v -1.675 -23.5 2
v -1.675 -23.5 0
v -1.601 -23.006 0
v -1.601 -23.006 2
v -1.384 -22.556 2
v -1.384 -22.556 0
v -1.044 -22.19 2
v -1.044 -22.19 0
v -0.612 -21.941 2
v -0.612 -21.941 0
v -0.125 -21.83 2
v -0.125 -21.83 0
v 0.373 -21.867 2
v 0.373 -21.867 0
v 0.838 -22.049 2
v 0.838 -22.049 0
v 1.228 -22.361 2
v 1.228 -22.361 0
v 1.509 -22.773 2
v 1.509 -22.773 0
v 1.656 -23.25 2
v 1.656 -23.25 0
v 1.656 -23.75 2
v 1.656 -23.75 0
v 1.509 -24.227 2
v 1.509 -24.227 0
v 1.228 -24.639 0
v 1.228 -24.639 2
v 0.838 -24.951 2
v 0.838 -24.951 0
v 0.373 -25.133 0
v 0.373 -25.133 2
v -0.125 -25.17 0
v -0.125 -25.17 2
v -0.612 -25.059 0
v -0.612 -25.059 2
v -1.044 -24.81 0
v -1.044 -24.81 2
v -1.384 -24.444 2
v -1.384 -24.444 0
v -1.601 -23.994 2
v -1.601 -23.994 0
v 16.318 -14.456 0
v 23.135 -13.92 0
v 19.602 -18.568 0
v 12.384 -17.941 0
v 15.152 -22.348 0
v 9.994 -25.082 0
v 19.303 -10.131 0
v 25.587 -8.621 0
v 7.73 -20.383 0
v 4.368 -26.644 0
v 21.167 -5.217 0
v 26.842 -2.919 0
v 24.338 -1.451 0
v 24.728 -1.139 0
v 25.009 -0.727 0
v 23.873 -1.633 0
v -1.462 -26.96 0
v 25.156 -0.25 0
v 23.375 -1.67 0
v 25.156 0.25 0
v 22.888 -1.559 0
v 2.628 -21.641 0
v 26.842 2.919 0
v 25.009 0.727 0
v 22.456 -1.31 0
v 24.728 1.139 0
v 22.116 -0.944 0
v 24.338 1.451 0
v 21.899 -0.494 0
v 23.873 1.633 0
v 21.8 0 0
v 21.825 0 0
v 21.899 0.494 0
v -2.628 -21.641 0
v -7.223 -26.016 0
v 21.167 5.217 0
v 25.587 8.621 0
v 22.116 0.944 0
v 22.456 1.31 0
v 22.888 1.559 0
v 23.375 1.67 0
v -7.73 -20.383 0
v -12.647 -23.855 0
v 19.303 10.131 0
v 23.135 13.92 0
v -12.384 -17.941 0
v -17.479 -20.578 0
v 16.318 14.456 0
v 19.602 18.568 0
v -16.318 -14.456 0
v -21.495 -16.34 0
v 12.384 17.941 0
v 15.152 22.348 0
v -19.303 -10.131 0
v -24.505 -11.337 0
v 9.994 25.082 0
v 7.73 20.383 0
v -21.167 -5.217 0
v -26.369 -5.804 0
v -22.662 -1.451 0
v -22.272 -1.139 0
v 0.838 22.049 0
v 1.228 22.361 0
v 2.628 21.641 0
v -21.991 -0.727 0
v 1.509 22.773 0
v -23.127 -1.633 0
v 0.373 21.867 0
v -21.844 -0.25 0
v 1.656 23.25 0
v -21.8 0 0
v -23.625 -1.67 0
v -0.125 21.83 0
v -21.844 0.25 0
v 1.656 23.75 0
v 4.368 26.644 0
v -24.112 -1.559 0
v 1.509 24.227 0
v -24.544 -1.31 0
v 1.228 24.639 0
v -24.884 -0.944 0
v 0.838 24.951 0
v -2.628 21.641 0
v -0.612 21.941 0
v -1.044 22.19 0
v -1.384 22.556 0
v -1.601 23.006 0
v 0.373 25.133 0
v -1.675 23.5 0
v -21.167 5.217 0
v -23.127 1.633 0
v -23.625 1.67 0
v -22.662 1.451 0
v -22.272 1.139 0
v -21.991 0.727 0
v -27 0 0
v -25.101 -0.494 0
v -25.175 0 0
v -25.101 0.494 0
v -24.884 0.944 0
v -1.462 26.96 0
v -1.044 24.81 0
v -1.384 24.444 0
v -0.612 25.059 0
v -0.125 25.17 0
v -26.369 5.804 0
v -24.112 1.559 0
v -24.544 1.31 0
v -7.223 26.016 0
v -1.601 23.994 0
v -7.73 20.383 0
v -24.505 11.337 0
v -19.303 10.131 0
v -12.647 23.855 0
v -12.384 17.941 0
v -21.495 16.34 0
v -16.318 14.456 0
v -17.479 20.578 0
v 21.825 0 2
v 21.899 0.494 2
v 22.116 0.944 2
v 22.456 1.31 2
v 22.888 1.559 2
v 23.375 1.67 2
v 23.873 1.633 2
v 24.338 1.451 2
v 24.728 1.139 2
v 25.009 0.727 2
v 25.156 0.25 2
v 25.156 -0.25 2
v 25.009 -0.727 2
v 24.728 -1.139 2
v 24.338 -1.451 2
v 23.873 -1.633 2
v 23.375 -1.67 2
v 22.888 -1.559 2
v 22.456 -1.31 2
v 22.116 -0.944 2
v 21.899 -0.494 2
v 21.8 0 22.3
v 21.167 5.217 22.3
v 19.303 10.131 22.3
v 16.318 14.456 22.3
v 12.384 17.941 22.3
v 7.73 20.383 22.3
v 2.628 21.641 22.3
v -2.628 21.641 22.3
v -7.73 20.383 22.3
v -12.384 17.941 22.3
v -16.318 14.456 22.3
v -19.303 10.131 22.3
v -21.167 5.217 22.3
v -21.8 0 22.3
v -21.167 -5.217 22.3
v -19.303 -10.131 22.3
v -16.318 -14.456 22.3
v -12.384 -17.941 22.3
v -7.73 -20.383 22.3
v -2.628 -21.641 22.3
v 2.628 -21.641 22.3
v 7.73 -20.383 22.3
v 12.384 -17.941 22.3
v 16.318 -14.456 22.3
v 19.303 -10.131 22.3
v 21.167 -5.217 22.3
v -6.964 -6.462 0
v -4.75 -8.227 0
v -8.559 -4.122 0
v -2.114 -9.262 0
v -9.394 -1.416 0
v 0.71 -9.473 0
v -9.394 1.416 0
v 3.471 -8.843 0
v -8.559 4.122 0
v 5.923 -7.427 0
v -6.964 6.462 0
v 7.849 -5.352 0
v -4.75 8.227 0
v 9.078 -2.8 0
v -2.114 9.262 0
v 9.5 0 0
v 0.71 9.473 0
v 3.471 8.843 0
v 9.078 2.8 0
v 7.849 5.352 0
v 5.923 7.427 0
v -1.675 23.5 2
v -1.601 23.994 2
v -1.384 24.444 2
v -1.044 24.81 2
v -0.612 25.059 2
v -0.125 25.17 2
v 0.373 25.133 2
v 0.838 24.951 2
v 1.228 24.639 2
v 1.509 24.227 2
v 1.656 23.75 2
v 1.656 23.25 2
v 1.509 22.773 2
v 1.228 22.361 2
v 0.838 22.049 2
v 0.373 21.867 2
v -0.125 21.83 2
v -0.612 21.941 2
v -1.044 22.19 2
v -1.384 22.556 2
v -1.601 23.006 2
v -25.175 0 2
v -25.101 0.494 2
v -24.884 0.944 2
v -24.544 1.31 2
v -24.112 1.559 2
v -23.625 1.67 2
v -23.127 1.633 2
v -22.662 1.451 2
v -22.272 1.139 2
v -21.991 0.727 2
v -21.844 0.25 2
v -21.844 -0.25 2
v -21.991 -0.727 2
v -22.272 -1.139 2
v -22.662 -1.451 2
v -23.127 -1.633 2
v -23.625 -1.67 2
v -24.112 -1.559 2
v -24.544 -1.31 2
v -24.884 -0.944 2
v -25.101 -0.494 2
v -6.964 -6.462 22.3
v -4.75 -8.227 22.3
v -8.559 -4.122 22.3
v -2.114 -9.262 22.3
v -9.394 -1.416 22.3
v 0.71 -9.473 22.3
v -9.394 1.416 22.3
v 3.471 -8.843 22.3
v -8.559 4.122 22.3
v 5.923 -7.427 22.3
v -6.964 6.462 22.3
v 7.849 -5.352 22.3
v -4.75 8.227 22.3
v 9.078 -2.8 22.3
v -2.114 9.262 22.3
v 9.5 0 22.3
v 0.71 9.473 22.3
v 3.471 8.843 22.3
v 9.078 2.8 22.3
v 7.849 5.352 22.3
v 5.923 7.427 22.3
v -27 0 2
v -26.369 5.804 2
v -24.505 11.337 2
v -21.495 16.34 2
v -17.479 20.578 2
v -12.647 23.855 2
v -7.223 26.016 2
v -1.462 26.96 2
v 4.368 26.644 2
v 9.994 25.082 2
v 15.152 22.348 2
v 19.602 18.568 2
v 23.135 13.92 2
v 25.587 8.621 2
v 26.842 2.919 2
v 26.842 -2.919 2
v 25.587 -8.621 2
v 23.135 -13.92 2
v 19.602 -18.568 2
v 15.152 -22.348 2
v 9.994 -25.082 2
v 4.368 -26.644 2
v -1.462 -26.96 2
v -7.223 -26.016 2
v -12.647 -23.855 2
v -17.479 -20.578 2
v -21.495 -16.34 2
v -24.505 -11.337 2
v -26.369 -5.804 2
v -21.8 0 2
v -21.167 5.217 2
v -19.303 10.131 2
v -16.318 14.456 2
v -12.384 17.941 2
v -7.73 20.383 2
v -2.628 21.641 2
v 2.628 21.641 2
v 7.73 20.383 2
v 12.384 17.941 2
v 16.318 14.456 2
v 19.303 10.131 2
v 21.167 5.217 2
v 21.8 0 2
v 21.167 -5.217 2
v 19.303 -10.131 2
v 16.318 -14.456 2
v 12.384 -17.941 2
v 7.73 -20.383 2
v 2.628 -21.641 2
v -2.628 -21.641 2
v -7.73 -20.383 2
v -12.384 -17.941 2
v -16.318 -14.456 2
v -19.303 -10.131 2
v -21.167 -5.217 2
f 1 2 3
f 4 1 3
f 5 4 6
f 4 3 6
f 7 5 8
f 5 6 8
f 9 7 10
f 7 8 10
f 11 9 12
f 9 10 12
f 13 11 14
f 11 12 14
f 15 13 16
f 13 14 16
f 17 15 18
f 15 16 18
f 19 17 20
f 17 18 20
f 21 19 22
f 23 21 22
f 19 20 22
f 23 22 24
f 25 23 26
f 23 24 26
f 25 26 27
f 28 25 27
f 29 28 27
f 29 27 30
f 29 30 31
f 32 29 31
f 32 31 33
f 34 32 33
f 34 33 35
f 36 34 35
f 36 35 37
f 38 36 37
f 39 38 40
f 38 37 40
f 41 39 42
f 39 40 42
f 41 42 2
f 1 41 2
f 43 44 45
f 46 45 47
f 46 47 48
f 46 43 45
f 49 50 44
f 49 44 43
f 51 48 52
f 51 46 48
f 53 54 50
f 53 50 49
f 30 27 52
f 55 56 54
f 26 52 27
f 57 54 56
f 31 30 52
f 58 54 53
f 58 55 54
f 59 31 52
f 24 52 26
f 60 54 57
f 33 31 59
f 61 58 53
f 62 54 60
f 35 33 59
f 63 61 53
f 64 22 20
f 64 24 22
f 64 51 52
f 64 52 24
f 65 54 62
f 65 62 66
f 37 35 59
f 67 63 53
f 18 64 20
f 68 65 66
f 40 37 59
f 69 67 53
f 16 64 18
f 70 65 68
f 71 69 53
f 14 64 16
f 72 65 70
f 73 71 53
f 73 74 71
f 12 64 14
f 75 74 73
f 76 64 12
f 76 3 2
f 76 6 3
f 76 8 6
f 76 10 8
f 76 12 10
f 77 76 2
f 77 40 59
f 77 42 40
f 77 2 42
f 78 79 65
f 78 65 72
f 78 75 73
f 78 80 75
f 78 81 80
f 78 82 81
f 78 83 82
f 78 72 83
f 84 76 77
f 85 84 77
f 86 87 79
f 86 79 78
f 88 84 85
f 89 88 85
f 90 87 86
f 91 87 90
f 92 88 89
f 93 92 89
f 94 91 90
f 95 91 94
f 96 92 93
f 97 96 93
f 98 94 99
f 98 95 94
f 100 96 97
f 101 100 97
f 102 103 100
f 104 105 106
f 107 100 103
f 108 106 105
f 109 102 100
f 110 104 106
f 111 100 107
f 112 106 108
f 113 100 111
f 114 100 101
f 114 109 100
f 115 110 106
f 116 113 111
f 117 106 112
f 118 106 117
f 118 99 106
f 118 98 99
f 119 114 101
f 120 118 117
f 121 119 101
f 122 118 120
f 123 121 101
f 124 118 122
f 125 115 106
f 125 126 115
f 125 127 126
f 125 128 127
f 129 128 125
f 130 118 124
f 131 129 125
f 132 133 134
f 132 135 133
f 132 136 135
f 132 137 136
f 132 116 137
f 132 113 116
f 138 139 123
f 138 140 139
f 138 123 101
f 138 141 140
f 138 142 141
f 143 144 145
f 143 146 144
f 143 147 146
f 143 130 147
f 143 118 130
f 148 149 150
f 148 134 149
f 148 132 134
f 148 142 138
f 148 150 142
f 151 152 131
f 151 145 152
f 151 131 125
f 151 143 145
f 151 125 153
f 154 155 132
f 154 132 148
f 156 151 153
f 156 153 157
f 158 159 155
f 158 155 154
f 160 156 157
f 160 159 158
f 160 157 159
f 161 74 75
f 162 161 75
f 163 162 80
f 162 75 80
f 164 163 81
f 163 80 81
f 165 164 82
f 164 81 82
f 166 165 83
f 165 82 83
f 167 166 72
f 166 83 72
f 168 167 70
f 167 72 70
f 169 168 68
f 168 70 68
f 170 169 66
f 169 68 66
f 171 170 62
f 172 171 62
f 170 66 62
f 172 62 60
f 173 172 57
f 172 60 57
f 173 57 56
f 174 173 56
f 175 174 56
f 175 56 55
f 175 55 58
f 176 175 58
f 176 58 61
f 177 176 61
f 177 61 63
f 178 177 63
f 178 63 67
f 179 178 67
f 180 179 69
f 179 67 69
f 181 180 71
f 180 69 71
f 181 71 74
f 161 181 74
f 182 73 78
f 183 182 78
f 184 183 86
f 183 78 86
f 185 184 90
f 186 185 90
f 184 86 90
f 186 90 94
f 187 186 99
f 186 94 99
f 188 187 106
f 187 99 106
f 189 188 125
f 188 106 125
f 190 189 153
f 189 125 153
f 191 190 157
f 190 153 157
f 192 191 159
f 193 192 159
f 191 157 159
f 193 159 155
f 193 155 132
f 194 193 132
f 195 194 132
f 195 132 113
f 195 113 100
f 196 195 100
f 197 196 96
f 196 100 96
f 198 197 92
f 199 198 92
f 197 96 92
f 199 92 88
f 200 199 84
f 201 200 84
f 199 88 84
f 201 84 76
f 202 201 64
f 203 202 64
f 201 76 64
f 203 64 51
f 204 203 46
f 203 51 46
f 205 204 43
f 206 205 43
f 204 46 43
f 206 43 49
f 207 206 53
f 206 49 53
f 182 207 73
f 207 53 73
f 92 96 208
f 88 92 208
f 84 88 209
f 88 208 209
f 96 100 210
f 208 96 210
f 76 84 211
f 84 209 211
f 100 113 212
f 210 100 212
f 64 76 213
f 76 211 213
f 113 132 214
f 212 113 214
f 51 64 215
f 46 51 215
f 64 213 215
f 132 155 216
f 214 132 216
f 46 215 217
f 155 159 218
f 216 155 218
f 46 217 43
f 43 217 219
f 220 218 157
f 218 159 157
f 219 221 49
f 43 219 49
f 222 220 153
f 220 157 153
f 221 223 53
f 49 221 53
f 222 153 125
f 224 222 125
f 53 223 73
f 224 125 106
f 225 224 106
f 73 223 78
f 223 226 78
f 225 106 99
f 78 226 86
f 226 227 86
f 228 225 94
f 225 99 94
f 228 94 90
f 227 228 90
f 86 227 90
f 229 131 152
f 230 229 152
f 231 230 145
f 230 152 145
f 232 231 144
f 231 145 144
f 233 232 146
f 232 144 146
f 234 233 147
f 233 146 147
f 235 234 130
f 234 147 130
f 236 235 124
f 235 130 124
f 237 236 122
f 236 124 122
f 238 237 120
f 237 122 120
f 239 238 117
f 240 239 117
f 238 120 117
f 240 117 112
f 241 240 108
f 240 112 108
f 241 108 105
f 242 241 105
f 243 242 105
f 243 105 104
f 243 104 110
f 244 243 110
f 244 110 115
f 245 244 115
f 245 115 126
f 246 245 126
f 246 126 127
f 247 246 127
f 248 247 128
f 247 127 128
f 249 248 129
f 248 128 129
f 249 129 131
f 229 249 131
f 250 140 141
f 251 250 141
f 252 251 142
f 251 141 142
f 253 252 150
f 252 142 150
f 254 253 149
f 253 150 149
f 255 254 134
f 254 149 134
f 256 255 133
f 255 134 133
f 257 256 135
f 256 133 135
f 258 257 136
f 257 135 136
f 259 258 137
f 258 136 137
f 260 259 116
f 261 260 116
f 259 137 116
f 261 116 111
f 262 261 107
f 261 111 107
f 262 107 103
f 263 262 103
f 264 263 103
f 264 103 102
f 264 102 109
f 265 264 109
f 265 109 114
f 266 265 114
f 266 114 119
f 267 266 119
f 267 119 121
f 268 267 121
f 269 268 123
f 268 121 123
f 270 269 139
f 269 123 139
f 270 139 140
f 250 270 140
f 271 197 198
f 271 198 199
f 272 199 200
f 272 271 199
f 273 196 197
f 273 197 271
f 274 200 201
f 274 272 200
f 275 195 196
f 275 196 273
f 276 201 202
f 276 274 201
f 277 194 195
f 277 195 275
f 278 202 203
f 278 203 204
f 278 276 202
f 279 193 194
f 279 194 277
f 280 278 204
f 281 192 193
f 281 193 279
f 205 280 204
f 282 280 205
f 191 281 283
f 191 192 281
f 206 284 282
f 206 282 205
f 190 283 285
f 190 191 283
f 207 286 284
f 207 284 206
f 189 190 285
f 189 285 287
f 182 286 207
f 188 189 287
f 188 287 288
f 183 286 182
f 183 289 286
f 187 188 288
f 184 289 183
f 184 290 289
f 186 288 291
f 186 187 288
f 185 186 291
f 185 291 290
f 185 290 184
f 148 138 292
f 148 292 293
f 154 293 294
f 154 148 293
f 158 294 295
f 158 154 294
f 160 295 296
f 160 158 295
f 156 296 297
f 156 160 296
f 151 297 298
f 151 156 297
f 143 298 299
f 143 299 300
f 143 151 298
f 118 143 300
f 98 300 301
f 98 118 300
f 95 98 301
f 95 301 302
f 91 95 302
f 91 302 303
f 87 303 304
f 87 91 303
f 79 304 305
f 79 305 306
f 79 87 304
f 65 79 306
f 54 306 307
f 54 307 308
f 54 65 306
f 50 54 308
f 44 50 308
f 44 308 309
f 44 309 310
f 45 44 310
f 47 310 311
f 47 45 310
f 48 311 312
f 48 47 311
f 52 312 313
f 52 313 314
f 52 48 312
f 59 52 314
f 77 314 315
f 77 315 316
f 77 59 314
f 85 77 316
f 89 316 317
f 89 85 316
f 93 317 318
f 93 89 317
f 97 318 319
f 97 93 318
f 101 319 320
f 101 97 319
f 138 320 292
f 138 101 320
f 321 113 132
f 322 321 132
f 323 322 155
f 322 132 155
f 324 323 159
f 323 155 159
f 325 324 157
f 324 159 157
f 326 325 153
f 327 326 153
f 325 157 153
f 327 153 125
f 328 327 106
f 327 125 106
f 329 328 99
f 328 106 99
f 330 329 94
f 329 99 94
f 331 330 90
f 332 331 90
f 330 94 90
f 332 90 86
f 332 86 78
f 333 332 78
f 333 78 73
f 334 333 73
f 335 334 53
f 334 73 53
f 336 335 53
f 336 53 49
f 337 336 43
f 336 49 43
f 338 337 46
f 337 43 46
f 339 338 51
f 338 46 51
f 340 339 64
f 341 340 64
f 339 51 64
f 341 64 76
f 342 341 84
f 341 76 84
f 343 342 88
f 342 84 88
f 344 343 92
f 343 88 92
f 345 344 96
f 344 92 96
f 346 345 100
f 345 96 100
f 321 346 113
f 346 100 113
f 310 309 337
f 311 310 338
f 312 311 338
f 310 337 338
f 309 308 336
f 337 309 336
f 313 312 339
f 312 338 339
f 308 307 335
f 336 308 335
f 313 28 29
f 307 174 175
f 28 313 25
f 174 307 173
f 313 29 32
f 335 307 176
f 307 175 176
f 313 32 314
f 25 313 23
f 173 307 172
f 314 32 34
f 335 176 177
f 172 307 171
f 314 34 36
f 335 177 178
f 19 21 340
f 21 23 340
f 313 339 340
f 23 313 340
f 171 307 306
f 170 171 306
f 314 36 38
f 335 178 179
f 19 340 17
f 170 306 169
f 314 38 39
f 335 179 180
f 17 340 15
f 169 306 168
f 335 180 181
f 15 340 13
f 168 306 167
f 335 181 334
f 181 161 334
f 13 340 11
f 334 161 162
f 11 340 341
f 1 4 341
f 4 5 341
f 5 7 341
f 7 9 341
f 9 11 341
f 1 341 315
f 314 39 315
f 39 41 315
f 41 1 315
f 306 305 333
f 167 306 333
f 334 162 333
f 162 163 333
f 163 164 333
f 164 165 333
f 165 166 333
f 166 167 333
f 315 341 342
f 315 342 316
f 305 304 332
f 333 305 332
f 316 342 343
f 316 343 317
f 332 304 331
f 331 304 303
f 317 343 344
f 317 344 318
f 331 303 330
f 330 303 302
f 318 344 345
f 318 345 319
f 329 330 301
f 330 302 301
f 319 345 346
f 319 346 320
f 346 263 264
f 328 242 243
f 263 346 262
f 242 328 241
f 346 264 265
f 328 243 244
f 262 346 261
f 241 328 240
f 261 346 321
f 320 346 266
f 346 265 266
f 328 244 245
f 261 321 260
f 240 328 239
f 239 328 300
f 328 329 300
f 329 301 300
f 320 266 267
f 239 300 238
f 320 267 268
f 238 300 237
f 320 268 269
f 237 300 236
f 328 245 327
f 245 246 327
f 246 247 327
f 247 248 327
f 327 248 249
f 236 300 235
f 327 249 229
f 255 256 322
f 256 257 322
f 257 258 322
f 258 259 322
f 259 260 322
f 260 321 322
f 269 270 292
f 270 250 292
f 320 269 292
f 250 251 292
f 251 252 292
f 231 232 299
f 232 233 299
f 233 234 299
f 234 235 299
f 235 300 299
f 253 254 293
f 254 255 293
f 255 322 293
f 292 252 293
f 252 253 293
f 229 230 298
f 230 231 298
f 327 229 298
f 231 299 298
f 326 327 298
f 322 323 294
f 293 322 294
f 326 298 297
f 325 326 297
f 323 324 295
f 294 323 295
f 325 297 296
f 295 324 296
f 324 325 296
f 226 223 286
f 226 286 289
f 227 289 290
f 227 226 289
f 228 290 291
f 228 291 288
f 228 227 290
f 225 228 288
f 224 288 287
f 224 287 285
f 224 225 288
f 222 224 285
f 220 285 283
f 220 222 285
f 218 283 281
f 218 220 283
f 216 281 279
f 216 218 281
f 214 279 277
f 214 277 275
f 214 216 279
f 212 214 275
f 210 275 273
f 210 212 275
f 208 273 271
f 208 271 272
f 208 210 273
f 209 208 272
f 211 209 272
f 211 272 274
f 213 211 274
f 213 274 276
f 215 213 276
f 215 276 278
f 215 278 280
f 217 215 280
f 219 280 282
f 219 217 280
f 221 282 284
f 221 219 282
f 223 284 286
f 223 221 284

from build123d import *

# Parameters (mm, degrees)
SKETCH_1_R      = 21.8
SKETCH_1_R_2    = 9.5
EXTRUDE_1_DEPTH = 22.3
SKETCH_2_R      = 27
SKETCH_2_R_2    = 21.8
SKETCH_2_R_3    = 1.675
EXTRUDE_2_DEPTH = 2


with BuildPart() as part:
    # 草圖1 → 填料-伸長1 (new body)
    with BuildSketch(Plane.XY):
        Circle(SKETCH_1_R)
        Circle(SKETCH_1_R_2, mode=Mode.SUBTRACT)
    extrude(amount=EXTRUDE_1_DEPTH)


with BuildPart() as body_2:
    # 草圖2 → 填料-伸長2 (new body)
    with BuildSketch(Plane(origin=(0, 0, 0), x_dir=(-1, 0, 0), z_dir=(0, 0, -1))):
        Circle(SKETCH_2_R)
        Circle(SKETCH_2_R_2, mode=Mode.SUBTRACT)
        with Locations((0, 23.5)):
            Circle(SKETCH_2_R_3, mode=Mode.SUBTRACT)
        with Locations((0, -23.5)):
            Circle(SKETCH_2_R_3, mode=Mode.SUBTRACT)
        with Locations((23.5, 0)):
            Circle(SKETCH_2_R_3, mode=Mode.SUBTRACT)
        with Locations((-23.5, 0)):
            Circle(SKETCH_2_R_3, mode=Mode.SUBTRACT)
    extrude(amount=-EXTRUDE_2_DEPTH)


solid = Compound([part.part, body_2.part])
